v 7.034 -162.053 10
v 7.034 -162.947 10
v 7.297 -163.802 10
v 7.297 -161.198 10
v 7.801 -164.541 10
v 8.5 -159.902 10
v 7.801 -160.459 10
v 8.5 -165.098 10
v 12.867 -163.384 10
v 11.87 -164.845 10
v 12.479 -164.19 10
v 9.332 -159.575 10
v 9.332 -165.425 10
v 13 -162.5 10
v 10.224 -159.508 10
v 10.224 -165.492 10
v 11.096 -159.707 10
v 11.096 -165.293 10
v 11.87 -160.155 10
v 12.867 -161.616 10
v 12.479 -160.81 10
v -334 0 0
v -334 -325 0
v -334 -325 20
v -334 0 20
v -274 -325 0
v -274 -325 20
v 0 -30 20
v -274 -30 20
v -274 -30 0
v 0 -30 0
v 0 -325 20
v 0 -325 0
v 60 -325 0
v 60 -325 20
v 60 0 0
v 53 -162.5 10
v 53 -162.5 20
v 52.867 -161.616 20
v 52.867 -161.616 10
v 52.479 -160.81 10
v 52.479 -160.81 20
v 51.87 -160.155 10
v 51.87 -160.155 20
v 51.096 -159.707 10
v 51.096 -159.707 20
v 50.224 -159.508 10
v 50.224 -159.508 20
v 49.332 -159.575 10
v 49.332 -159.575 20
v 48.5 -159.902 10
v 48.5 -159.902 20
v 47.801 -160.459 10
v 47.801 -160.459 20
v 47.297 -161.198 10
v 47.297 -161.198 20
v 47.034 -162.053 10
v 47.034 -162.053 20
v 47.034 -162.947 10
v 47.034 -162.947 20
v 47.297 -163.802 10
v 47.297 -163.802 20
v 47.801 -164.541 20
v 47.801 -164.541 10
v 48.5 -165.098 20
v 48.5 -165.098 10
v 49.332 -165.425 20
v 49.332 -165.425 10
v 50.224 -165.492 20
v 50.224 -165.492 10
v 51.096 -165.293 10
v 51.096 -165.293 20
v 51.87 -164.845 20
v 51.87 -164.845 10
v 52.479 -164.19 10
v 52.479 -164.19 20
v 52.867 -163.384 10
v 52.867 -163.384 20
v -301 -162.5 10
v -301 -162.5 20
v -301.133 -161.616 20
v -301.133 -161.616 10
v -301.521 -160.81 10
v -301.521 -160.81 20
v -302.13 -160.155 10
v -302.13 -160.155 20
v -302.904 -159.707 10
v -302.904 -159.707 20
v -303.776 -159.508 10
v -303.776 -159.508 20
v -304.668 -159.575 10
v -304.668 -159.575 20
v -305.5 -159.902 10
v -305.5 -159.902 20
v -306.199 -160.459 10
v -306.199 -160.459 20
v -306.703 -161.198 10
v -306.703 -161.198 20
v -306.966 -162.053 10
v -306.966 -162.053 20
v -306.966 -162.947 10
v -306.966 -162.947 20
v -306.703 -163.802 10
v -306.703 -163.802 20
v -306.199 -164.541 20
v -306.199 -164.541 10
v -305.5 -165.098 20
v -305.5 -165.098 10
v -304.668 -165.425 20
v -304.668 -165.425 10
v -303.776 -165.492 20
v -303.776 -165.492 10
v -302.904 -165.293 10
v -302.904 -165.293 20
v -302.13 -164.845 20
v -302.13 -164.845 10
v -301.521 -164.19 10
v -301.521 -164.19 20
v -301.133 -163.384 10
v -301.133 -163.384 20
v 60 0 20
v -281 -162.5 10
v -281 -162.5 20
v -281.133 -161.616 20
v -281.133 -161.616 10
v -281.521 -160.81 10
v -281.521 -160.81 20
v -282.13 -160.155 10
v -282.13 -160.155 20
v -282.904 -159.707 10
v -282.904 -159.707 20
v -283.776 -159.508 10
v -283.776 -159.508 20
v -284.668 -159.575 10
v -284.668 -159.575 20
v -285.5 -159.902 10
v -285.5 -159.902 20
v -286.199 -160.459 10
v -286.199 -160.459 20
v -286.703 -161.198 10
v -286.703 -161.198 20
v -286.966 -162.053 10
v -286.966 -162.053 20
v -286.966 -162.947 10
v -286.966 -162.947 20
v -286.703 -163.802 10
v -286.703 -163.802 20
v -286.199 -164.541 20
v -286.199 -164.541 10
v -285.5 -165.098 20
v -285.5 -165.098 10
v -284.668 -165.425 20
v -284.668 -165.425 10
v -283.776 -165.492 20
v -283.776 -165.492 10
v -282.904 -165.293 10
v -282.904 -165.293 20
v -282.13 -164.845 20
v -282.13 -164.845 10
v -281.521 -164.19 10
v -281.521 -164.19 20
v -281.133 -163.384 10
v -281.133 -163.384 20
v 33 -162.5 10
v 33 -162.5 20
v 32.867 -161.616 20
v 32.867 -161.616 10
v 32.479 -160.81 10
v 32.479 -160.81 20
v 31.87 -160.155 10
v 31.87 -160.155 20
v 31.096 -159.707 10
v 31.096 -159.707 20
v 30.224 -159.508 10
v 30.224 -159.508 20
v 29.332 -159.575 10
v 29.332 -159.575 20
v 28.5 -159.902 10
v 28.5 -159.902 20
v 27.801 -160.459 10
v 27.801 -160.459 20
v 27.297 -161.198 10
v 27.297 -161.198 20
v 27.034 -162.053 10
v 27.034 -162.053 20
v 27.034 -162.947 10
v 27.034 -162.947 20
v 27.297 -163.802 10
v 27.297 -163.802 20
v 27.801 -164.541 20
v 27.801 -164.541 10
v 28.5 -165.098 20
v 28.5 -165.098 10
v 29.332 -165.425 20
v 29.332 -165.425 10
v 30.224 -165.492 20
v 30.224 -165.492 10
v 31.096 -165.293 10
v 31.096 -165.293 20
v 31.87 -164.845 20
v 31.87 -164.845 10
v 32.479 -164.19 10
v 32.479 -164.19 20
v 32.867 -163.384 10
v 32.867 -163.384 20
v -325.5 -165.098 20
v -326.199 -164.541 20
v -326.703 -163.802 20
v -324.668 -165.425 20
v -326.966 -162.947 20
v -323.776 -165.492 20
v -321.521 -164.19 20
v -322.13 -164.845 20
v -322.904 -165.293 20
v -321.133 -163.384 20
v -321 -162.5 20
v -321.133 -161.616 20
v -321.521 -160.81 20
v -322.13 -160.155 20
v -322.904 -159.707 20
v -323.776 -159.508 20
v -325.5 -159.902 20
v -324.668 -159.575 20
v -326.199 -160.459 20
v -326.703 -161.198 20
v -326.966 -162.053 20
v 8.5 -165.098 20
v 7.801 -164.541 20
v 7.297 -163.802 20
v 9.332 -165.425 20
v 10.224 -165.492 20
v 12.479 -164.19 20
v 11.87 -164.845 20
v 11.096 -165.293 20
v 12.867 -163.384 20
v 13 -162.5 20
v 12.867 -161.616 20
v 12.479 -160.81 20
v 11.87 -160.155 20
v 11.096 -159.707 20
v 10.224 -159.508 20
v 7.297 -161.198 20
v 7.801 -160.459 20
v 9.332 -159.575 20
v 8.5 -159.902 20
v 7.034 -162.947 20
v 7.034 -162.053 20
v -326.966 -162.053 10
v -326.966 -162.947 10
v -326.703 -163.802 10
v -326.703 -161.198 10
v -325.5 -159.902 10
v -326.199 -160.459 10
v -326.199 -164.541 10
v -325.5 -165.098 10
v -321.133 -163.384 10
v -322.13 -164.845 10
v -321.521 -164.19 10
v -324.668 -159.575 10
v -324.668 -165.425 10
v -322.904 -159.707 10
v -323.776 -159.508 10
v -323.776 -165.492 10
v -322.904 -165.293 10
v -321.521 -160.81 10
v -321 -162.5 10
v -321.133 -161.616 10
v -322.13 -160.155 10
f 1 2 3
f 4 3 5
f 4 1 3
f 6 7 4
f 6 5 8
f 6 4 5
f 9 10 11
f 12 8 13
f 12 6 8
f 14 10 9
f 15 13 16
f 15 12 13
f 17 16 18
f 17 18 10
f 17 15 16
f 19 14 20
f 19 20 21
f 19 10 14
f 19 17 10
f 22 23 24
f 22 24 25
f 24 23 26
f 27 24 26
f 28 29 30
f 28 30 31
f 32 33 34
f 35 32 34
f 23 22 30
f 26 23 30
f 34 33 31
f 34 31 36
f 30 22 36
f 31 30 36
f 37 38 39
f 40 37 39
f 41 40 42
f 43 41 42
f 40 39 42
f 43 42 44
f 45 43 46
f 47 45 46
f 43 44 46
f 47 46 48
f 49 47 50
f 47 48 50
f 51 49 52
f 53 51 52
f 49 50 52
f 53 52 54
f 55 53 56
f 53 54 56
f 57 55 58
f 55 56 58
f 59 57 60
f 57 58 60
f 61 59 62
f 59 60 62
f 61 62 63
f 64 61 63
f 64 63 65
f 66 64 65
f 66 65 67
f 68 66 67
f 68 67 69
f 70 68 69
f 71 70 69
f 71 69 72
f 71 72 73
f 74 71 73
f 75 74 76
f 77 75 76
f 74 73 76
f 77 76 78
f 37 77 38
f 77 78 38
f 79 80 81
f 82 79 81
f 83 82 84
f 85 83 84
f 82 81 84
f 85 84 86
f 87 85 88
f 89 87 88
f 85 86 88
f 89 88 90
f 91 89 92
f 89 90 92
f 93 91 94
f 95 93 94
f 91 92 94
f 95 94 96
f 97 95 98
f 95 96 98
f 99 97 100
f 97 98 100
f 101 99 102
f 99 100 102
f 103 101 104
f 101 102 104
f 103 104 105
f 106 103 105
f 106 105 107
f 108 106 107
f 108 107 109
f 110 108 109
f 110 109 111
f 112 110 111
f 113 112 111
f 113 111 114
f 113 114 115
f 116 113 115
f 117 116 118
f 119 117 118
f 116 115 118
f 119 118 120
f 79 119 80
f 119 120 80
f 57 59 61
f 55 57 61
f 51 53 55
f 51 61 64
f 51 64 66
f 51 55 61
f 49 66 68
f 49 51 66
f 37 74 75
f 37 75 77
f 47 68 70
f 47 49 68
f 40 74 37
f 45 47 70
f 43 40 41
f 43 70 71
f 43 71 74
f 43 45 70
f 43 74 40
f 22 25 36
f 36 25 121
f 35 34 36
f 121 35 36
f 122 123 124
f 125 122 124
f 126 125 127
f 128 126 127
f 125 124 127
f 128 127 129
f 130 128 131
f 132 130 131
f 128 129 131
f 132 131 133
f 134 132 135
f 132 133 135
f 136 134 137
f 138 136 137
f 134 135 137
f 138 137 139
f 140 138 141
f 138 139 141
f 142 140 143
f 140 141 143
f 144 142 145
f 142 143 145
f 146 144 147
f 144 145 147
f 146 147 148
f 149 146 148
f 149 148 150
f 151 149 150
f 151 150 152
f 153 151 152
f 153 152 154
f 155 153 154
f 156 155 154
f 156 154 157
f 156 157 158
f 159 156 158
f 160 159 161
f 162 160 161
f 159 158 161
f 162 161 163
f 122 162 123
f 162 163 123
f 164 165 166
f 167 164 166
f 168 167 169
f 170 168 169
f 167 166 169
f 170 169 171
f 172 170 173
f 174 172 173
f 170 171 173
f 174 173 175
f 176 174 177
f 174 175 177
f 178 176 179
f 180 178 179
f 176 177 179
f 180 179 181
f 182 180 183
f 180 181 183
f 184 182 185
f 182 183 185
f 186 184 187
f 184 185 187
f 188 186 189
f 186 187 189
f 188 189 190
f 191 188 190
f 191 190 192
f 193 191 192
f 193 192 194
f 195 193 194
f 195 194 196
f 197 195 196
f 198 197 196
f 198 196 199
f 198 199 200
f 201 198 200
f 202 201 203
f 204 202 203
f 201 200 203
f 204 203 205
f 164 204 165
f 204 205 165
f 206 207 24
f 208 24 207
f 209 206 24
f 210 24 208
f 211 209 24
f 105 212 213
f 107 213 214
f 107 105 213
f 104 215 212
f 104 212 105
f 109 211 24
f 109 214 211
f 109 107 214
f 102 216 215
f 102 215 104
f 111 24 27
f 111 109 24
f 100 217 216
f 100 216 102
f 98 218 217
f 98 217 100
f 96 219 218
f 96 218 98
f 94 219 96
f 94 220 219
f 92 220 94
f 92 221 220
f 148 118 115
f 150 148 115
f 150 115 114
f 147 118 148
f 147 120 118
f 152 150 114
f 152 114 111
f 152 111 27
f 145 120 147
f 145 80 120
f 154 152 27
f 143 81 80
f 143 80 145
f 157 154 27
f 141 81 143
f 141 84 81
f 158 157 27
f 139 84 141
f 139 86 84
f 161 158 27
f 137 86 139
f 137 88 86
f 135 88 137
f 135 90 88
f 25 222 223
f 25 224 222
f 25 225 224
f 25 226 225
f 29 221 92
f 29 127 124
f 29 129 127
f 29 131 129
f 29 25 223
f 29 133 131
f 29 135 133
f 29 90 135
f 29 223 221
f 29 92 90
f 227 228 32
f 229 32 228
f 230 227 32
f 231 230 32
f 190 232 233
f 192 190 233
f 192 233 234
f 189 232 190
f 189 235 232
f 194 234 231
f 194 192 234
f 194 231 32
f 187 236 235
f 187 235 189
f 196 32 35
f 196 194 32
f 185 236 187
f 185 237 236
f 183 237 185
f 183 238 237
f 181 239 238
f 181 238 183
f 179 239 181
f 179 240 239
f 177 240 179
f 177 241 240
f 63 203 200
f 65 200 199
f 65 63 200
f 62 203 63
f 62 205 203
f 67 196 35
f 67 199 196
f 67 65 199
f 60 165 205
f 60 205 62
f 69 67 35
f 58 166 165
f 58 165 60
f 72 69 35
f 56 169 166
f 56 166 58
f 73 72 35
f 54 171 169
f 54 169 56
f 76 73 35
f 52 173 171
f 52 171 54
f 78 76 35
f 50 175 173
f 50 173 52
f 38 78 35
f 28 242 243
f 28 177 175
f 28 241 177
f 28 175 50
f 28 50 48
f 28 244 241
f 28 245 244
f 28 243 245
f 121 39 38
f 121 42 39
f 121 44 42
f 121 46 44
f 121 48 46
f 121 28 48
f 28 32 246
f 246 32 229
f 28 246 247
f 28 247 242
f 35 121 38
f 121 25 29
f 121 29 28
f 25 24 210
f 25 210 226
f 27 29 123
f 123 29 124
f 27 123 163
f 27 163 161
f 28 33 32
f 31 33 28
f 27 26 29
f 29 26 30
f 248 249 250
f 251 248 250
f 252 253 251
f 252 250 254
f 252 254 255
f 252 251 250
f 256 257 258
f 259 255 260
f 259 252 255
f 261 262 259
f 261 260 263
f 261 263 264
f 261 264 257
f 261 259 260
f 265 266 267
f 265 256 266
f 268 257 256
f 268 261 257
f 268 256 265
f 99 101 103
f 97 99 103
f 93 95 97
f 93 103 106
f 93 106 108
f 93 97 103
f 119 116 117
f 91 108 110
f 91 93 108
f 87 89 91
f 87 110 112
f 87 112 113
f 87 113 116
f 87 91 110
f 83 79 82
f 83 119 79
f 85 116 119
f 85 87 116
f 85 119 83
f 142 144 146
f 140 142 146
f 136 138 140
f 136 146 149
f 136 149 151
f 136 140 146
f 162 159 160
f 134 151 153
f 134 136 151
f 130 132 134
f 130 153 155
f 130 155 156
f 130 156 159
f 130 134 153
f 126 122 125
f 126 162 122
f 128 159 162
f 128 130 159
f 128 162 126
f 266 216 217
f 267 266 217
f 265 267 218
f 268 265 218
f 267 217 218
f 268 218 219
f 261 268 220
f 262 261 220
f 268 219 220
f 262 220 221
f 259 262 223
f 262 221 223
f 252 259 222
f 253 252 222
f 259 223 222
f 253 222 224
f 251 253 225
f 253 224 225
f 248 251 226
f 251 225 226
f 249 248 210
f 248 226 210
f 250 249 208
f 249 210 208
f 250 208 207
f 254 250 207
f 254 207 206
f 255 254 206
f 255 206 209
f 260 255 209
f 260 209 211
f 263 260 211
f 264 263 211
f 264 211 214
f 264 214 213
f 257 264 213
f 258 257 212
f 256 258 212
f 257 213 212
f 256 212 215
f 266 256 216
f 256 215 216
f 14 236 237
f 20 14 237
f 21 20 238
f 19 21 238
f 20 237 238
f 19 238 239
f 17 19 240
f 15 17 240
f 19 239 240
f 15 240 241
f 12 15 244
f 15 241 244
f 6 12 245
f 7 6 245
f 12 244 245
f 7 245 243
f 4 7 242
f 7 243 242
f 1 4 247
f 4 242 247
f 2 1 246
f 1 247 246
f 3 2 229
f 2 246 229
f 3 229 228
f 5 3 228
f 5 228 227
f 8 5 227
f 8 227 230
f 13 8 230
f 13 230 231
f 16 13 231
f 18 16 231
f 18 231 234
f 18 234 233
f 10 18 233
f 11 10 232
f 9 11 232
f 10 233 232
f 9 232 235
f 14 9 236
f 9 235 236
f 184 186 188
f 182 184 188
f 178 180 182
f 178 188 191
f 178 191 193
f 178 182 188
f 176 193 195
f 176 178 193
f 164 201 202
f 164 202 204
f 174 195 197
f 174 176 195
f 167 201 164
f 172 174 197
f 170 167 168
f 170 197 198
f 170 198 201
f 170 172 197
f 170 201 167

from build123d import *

# Parameters (mm, degrees)
SKETCH_1_W          = 60
SKETCH_1_H          = 325
EXTRUDE_1_DEPTH     = 20
EXTRUDE_1_2_DEPTH   = 20
SKETCH_3_R          = 3
CUT_EXTRUDE_1_DEPTH = 10
SKETCH_5_W          = 274
SKETCH_5_H          = 30
EXTRUDE_2_DEPTH     = 20


with BuildPart() as part:
    # 草图1 → 凸台-拉伸1 (new body)
    with BuildSketch(Plane.XY):
        with Locations((30, -162.5)):
            Rectangle(SKETCH_1_W, SKETCH_1_H)
    extrude(amount=EXTRUDE_1_DEPTH)


with BuildPart() as body_2:
    # 草图1 → Extrude 1 2 (new body)
    with BuildSketch(Plane.XY):
        with Locations((-304, -162.5)):
            Rectangle(SKETCH_1_W, SKETCH_1_H)
    extrude(amount=EXTRUDE_1_2_DEPTH)


with BuildPart() as cut_extrude_1_tool:
    # 草图3 → 切除-拉伸1 (new body)
    with BuildSketch(Plane.XY.offset(20)):
        with Locations((50, -162.5)):
            Circle(SKETCH_3_R)
        with Locations((10, -162.5)):
            Circle(SKETCH_3_R)
        with Locations((30, -162.5)):
            Circle(SKETCH_3_R)
        with Locations((-324, -162.5)):
            Circle(SKETCH_3_R)
        with Locations((-304, -162.5)):
            Circle(SKETCH_3_R)
        with Locations((-284, -162.5)):
            Circle(SKETCH_3_R)
    extrude(amount=-CUT_EXTRUDE_1_DEPTH)


with BuildPart() as part_1:
    add(part.part)

    # 切除-拉伸1: cut by cut_extrude_1_tool
    add(cut_extrude_1_tool.part, mode=Mode.SUBTRACT)



with BuildPart() as body_2_1:
    add(body_2.part)

    # 切除-拉伸1: cut by cut_extrude_1_tool
    add(cut_extrude_1_tool.part, mode=Mode.SUBTRACT)


with BuildPart() as part_2:
    add(part_1.part)

    add(body_2_1.part)  # 凸台-拉伸2 merges body 2
    # 草图5 → 凸台-拉伸2 (add)
    with BuildSketch(Plane.XY.offset(20)):
        with Locations((-137, -15)):
            Rectangle(SKETCH_5_W, SKETCH_5_H)
    extrude(amount=-EXTRUDE_2_DEPTH)


solid = part_2.part
